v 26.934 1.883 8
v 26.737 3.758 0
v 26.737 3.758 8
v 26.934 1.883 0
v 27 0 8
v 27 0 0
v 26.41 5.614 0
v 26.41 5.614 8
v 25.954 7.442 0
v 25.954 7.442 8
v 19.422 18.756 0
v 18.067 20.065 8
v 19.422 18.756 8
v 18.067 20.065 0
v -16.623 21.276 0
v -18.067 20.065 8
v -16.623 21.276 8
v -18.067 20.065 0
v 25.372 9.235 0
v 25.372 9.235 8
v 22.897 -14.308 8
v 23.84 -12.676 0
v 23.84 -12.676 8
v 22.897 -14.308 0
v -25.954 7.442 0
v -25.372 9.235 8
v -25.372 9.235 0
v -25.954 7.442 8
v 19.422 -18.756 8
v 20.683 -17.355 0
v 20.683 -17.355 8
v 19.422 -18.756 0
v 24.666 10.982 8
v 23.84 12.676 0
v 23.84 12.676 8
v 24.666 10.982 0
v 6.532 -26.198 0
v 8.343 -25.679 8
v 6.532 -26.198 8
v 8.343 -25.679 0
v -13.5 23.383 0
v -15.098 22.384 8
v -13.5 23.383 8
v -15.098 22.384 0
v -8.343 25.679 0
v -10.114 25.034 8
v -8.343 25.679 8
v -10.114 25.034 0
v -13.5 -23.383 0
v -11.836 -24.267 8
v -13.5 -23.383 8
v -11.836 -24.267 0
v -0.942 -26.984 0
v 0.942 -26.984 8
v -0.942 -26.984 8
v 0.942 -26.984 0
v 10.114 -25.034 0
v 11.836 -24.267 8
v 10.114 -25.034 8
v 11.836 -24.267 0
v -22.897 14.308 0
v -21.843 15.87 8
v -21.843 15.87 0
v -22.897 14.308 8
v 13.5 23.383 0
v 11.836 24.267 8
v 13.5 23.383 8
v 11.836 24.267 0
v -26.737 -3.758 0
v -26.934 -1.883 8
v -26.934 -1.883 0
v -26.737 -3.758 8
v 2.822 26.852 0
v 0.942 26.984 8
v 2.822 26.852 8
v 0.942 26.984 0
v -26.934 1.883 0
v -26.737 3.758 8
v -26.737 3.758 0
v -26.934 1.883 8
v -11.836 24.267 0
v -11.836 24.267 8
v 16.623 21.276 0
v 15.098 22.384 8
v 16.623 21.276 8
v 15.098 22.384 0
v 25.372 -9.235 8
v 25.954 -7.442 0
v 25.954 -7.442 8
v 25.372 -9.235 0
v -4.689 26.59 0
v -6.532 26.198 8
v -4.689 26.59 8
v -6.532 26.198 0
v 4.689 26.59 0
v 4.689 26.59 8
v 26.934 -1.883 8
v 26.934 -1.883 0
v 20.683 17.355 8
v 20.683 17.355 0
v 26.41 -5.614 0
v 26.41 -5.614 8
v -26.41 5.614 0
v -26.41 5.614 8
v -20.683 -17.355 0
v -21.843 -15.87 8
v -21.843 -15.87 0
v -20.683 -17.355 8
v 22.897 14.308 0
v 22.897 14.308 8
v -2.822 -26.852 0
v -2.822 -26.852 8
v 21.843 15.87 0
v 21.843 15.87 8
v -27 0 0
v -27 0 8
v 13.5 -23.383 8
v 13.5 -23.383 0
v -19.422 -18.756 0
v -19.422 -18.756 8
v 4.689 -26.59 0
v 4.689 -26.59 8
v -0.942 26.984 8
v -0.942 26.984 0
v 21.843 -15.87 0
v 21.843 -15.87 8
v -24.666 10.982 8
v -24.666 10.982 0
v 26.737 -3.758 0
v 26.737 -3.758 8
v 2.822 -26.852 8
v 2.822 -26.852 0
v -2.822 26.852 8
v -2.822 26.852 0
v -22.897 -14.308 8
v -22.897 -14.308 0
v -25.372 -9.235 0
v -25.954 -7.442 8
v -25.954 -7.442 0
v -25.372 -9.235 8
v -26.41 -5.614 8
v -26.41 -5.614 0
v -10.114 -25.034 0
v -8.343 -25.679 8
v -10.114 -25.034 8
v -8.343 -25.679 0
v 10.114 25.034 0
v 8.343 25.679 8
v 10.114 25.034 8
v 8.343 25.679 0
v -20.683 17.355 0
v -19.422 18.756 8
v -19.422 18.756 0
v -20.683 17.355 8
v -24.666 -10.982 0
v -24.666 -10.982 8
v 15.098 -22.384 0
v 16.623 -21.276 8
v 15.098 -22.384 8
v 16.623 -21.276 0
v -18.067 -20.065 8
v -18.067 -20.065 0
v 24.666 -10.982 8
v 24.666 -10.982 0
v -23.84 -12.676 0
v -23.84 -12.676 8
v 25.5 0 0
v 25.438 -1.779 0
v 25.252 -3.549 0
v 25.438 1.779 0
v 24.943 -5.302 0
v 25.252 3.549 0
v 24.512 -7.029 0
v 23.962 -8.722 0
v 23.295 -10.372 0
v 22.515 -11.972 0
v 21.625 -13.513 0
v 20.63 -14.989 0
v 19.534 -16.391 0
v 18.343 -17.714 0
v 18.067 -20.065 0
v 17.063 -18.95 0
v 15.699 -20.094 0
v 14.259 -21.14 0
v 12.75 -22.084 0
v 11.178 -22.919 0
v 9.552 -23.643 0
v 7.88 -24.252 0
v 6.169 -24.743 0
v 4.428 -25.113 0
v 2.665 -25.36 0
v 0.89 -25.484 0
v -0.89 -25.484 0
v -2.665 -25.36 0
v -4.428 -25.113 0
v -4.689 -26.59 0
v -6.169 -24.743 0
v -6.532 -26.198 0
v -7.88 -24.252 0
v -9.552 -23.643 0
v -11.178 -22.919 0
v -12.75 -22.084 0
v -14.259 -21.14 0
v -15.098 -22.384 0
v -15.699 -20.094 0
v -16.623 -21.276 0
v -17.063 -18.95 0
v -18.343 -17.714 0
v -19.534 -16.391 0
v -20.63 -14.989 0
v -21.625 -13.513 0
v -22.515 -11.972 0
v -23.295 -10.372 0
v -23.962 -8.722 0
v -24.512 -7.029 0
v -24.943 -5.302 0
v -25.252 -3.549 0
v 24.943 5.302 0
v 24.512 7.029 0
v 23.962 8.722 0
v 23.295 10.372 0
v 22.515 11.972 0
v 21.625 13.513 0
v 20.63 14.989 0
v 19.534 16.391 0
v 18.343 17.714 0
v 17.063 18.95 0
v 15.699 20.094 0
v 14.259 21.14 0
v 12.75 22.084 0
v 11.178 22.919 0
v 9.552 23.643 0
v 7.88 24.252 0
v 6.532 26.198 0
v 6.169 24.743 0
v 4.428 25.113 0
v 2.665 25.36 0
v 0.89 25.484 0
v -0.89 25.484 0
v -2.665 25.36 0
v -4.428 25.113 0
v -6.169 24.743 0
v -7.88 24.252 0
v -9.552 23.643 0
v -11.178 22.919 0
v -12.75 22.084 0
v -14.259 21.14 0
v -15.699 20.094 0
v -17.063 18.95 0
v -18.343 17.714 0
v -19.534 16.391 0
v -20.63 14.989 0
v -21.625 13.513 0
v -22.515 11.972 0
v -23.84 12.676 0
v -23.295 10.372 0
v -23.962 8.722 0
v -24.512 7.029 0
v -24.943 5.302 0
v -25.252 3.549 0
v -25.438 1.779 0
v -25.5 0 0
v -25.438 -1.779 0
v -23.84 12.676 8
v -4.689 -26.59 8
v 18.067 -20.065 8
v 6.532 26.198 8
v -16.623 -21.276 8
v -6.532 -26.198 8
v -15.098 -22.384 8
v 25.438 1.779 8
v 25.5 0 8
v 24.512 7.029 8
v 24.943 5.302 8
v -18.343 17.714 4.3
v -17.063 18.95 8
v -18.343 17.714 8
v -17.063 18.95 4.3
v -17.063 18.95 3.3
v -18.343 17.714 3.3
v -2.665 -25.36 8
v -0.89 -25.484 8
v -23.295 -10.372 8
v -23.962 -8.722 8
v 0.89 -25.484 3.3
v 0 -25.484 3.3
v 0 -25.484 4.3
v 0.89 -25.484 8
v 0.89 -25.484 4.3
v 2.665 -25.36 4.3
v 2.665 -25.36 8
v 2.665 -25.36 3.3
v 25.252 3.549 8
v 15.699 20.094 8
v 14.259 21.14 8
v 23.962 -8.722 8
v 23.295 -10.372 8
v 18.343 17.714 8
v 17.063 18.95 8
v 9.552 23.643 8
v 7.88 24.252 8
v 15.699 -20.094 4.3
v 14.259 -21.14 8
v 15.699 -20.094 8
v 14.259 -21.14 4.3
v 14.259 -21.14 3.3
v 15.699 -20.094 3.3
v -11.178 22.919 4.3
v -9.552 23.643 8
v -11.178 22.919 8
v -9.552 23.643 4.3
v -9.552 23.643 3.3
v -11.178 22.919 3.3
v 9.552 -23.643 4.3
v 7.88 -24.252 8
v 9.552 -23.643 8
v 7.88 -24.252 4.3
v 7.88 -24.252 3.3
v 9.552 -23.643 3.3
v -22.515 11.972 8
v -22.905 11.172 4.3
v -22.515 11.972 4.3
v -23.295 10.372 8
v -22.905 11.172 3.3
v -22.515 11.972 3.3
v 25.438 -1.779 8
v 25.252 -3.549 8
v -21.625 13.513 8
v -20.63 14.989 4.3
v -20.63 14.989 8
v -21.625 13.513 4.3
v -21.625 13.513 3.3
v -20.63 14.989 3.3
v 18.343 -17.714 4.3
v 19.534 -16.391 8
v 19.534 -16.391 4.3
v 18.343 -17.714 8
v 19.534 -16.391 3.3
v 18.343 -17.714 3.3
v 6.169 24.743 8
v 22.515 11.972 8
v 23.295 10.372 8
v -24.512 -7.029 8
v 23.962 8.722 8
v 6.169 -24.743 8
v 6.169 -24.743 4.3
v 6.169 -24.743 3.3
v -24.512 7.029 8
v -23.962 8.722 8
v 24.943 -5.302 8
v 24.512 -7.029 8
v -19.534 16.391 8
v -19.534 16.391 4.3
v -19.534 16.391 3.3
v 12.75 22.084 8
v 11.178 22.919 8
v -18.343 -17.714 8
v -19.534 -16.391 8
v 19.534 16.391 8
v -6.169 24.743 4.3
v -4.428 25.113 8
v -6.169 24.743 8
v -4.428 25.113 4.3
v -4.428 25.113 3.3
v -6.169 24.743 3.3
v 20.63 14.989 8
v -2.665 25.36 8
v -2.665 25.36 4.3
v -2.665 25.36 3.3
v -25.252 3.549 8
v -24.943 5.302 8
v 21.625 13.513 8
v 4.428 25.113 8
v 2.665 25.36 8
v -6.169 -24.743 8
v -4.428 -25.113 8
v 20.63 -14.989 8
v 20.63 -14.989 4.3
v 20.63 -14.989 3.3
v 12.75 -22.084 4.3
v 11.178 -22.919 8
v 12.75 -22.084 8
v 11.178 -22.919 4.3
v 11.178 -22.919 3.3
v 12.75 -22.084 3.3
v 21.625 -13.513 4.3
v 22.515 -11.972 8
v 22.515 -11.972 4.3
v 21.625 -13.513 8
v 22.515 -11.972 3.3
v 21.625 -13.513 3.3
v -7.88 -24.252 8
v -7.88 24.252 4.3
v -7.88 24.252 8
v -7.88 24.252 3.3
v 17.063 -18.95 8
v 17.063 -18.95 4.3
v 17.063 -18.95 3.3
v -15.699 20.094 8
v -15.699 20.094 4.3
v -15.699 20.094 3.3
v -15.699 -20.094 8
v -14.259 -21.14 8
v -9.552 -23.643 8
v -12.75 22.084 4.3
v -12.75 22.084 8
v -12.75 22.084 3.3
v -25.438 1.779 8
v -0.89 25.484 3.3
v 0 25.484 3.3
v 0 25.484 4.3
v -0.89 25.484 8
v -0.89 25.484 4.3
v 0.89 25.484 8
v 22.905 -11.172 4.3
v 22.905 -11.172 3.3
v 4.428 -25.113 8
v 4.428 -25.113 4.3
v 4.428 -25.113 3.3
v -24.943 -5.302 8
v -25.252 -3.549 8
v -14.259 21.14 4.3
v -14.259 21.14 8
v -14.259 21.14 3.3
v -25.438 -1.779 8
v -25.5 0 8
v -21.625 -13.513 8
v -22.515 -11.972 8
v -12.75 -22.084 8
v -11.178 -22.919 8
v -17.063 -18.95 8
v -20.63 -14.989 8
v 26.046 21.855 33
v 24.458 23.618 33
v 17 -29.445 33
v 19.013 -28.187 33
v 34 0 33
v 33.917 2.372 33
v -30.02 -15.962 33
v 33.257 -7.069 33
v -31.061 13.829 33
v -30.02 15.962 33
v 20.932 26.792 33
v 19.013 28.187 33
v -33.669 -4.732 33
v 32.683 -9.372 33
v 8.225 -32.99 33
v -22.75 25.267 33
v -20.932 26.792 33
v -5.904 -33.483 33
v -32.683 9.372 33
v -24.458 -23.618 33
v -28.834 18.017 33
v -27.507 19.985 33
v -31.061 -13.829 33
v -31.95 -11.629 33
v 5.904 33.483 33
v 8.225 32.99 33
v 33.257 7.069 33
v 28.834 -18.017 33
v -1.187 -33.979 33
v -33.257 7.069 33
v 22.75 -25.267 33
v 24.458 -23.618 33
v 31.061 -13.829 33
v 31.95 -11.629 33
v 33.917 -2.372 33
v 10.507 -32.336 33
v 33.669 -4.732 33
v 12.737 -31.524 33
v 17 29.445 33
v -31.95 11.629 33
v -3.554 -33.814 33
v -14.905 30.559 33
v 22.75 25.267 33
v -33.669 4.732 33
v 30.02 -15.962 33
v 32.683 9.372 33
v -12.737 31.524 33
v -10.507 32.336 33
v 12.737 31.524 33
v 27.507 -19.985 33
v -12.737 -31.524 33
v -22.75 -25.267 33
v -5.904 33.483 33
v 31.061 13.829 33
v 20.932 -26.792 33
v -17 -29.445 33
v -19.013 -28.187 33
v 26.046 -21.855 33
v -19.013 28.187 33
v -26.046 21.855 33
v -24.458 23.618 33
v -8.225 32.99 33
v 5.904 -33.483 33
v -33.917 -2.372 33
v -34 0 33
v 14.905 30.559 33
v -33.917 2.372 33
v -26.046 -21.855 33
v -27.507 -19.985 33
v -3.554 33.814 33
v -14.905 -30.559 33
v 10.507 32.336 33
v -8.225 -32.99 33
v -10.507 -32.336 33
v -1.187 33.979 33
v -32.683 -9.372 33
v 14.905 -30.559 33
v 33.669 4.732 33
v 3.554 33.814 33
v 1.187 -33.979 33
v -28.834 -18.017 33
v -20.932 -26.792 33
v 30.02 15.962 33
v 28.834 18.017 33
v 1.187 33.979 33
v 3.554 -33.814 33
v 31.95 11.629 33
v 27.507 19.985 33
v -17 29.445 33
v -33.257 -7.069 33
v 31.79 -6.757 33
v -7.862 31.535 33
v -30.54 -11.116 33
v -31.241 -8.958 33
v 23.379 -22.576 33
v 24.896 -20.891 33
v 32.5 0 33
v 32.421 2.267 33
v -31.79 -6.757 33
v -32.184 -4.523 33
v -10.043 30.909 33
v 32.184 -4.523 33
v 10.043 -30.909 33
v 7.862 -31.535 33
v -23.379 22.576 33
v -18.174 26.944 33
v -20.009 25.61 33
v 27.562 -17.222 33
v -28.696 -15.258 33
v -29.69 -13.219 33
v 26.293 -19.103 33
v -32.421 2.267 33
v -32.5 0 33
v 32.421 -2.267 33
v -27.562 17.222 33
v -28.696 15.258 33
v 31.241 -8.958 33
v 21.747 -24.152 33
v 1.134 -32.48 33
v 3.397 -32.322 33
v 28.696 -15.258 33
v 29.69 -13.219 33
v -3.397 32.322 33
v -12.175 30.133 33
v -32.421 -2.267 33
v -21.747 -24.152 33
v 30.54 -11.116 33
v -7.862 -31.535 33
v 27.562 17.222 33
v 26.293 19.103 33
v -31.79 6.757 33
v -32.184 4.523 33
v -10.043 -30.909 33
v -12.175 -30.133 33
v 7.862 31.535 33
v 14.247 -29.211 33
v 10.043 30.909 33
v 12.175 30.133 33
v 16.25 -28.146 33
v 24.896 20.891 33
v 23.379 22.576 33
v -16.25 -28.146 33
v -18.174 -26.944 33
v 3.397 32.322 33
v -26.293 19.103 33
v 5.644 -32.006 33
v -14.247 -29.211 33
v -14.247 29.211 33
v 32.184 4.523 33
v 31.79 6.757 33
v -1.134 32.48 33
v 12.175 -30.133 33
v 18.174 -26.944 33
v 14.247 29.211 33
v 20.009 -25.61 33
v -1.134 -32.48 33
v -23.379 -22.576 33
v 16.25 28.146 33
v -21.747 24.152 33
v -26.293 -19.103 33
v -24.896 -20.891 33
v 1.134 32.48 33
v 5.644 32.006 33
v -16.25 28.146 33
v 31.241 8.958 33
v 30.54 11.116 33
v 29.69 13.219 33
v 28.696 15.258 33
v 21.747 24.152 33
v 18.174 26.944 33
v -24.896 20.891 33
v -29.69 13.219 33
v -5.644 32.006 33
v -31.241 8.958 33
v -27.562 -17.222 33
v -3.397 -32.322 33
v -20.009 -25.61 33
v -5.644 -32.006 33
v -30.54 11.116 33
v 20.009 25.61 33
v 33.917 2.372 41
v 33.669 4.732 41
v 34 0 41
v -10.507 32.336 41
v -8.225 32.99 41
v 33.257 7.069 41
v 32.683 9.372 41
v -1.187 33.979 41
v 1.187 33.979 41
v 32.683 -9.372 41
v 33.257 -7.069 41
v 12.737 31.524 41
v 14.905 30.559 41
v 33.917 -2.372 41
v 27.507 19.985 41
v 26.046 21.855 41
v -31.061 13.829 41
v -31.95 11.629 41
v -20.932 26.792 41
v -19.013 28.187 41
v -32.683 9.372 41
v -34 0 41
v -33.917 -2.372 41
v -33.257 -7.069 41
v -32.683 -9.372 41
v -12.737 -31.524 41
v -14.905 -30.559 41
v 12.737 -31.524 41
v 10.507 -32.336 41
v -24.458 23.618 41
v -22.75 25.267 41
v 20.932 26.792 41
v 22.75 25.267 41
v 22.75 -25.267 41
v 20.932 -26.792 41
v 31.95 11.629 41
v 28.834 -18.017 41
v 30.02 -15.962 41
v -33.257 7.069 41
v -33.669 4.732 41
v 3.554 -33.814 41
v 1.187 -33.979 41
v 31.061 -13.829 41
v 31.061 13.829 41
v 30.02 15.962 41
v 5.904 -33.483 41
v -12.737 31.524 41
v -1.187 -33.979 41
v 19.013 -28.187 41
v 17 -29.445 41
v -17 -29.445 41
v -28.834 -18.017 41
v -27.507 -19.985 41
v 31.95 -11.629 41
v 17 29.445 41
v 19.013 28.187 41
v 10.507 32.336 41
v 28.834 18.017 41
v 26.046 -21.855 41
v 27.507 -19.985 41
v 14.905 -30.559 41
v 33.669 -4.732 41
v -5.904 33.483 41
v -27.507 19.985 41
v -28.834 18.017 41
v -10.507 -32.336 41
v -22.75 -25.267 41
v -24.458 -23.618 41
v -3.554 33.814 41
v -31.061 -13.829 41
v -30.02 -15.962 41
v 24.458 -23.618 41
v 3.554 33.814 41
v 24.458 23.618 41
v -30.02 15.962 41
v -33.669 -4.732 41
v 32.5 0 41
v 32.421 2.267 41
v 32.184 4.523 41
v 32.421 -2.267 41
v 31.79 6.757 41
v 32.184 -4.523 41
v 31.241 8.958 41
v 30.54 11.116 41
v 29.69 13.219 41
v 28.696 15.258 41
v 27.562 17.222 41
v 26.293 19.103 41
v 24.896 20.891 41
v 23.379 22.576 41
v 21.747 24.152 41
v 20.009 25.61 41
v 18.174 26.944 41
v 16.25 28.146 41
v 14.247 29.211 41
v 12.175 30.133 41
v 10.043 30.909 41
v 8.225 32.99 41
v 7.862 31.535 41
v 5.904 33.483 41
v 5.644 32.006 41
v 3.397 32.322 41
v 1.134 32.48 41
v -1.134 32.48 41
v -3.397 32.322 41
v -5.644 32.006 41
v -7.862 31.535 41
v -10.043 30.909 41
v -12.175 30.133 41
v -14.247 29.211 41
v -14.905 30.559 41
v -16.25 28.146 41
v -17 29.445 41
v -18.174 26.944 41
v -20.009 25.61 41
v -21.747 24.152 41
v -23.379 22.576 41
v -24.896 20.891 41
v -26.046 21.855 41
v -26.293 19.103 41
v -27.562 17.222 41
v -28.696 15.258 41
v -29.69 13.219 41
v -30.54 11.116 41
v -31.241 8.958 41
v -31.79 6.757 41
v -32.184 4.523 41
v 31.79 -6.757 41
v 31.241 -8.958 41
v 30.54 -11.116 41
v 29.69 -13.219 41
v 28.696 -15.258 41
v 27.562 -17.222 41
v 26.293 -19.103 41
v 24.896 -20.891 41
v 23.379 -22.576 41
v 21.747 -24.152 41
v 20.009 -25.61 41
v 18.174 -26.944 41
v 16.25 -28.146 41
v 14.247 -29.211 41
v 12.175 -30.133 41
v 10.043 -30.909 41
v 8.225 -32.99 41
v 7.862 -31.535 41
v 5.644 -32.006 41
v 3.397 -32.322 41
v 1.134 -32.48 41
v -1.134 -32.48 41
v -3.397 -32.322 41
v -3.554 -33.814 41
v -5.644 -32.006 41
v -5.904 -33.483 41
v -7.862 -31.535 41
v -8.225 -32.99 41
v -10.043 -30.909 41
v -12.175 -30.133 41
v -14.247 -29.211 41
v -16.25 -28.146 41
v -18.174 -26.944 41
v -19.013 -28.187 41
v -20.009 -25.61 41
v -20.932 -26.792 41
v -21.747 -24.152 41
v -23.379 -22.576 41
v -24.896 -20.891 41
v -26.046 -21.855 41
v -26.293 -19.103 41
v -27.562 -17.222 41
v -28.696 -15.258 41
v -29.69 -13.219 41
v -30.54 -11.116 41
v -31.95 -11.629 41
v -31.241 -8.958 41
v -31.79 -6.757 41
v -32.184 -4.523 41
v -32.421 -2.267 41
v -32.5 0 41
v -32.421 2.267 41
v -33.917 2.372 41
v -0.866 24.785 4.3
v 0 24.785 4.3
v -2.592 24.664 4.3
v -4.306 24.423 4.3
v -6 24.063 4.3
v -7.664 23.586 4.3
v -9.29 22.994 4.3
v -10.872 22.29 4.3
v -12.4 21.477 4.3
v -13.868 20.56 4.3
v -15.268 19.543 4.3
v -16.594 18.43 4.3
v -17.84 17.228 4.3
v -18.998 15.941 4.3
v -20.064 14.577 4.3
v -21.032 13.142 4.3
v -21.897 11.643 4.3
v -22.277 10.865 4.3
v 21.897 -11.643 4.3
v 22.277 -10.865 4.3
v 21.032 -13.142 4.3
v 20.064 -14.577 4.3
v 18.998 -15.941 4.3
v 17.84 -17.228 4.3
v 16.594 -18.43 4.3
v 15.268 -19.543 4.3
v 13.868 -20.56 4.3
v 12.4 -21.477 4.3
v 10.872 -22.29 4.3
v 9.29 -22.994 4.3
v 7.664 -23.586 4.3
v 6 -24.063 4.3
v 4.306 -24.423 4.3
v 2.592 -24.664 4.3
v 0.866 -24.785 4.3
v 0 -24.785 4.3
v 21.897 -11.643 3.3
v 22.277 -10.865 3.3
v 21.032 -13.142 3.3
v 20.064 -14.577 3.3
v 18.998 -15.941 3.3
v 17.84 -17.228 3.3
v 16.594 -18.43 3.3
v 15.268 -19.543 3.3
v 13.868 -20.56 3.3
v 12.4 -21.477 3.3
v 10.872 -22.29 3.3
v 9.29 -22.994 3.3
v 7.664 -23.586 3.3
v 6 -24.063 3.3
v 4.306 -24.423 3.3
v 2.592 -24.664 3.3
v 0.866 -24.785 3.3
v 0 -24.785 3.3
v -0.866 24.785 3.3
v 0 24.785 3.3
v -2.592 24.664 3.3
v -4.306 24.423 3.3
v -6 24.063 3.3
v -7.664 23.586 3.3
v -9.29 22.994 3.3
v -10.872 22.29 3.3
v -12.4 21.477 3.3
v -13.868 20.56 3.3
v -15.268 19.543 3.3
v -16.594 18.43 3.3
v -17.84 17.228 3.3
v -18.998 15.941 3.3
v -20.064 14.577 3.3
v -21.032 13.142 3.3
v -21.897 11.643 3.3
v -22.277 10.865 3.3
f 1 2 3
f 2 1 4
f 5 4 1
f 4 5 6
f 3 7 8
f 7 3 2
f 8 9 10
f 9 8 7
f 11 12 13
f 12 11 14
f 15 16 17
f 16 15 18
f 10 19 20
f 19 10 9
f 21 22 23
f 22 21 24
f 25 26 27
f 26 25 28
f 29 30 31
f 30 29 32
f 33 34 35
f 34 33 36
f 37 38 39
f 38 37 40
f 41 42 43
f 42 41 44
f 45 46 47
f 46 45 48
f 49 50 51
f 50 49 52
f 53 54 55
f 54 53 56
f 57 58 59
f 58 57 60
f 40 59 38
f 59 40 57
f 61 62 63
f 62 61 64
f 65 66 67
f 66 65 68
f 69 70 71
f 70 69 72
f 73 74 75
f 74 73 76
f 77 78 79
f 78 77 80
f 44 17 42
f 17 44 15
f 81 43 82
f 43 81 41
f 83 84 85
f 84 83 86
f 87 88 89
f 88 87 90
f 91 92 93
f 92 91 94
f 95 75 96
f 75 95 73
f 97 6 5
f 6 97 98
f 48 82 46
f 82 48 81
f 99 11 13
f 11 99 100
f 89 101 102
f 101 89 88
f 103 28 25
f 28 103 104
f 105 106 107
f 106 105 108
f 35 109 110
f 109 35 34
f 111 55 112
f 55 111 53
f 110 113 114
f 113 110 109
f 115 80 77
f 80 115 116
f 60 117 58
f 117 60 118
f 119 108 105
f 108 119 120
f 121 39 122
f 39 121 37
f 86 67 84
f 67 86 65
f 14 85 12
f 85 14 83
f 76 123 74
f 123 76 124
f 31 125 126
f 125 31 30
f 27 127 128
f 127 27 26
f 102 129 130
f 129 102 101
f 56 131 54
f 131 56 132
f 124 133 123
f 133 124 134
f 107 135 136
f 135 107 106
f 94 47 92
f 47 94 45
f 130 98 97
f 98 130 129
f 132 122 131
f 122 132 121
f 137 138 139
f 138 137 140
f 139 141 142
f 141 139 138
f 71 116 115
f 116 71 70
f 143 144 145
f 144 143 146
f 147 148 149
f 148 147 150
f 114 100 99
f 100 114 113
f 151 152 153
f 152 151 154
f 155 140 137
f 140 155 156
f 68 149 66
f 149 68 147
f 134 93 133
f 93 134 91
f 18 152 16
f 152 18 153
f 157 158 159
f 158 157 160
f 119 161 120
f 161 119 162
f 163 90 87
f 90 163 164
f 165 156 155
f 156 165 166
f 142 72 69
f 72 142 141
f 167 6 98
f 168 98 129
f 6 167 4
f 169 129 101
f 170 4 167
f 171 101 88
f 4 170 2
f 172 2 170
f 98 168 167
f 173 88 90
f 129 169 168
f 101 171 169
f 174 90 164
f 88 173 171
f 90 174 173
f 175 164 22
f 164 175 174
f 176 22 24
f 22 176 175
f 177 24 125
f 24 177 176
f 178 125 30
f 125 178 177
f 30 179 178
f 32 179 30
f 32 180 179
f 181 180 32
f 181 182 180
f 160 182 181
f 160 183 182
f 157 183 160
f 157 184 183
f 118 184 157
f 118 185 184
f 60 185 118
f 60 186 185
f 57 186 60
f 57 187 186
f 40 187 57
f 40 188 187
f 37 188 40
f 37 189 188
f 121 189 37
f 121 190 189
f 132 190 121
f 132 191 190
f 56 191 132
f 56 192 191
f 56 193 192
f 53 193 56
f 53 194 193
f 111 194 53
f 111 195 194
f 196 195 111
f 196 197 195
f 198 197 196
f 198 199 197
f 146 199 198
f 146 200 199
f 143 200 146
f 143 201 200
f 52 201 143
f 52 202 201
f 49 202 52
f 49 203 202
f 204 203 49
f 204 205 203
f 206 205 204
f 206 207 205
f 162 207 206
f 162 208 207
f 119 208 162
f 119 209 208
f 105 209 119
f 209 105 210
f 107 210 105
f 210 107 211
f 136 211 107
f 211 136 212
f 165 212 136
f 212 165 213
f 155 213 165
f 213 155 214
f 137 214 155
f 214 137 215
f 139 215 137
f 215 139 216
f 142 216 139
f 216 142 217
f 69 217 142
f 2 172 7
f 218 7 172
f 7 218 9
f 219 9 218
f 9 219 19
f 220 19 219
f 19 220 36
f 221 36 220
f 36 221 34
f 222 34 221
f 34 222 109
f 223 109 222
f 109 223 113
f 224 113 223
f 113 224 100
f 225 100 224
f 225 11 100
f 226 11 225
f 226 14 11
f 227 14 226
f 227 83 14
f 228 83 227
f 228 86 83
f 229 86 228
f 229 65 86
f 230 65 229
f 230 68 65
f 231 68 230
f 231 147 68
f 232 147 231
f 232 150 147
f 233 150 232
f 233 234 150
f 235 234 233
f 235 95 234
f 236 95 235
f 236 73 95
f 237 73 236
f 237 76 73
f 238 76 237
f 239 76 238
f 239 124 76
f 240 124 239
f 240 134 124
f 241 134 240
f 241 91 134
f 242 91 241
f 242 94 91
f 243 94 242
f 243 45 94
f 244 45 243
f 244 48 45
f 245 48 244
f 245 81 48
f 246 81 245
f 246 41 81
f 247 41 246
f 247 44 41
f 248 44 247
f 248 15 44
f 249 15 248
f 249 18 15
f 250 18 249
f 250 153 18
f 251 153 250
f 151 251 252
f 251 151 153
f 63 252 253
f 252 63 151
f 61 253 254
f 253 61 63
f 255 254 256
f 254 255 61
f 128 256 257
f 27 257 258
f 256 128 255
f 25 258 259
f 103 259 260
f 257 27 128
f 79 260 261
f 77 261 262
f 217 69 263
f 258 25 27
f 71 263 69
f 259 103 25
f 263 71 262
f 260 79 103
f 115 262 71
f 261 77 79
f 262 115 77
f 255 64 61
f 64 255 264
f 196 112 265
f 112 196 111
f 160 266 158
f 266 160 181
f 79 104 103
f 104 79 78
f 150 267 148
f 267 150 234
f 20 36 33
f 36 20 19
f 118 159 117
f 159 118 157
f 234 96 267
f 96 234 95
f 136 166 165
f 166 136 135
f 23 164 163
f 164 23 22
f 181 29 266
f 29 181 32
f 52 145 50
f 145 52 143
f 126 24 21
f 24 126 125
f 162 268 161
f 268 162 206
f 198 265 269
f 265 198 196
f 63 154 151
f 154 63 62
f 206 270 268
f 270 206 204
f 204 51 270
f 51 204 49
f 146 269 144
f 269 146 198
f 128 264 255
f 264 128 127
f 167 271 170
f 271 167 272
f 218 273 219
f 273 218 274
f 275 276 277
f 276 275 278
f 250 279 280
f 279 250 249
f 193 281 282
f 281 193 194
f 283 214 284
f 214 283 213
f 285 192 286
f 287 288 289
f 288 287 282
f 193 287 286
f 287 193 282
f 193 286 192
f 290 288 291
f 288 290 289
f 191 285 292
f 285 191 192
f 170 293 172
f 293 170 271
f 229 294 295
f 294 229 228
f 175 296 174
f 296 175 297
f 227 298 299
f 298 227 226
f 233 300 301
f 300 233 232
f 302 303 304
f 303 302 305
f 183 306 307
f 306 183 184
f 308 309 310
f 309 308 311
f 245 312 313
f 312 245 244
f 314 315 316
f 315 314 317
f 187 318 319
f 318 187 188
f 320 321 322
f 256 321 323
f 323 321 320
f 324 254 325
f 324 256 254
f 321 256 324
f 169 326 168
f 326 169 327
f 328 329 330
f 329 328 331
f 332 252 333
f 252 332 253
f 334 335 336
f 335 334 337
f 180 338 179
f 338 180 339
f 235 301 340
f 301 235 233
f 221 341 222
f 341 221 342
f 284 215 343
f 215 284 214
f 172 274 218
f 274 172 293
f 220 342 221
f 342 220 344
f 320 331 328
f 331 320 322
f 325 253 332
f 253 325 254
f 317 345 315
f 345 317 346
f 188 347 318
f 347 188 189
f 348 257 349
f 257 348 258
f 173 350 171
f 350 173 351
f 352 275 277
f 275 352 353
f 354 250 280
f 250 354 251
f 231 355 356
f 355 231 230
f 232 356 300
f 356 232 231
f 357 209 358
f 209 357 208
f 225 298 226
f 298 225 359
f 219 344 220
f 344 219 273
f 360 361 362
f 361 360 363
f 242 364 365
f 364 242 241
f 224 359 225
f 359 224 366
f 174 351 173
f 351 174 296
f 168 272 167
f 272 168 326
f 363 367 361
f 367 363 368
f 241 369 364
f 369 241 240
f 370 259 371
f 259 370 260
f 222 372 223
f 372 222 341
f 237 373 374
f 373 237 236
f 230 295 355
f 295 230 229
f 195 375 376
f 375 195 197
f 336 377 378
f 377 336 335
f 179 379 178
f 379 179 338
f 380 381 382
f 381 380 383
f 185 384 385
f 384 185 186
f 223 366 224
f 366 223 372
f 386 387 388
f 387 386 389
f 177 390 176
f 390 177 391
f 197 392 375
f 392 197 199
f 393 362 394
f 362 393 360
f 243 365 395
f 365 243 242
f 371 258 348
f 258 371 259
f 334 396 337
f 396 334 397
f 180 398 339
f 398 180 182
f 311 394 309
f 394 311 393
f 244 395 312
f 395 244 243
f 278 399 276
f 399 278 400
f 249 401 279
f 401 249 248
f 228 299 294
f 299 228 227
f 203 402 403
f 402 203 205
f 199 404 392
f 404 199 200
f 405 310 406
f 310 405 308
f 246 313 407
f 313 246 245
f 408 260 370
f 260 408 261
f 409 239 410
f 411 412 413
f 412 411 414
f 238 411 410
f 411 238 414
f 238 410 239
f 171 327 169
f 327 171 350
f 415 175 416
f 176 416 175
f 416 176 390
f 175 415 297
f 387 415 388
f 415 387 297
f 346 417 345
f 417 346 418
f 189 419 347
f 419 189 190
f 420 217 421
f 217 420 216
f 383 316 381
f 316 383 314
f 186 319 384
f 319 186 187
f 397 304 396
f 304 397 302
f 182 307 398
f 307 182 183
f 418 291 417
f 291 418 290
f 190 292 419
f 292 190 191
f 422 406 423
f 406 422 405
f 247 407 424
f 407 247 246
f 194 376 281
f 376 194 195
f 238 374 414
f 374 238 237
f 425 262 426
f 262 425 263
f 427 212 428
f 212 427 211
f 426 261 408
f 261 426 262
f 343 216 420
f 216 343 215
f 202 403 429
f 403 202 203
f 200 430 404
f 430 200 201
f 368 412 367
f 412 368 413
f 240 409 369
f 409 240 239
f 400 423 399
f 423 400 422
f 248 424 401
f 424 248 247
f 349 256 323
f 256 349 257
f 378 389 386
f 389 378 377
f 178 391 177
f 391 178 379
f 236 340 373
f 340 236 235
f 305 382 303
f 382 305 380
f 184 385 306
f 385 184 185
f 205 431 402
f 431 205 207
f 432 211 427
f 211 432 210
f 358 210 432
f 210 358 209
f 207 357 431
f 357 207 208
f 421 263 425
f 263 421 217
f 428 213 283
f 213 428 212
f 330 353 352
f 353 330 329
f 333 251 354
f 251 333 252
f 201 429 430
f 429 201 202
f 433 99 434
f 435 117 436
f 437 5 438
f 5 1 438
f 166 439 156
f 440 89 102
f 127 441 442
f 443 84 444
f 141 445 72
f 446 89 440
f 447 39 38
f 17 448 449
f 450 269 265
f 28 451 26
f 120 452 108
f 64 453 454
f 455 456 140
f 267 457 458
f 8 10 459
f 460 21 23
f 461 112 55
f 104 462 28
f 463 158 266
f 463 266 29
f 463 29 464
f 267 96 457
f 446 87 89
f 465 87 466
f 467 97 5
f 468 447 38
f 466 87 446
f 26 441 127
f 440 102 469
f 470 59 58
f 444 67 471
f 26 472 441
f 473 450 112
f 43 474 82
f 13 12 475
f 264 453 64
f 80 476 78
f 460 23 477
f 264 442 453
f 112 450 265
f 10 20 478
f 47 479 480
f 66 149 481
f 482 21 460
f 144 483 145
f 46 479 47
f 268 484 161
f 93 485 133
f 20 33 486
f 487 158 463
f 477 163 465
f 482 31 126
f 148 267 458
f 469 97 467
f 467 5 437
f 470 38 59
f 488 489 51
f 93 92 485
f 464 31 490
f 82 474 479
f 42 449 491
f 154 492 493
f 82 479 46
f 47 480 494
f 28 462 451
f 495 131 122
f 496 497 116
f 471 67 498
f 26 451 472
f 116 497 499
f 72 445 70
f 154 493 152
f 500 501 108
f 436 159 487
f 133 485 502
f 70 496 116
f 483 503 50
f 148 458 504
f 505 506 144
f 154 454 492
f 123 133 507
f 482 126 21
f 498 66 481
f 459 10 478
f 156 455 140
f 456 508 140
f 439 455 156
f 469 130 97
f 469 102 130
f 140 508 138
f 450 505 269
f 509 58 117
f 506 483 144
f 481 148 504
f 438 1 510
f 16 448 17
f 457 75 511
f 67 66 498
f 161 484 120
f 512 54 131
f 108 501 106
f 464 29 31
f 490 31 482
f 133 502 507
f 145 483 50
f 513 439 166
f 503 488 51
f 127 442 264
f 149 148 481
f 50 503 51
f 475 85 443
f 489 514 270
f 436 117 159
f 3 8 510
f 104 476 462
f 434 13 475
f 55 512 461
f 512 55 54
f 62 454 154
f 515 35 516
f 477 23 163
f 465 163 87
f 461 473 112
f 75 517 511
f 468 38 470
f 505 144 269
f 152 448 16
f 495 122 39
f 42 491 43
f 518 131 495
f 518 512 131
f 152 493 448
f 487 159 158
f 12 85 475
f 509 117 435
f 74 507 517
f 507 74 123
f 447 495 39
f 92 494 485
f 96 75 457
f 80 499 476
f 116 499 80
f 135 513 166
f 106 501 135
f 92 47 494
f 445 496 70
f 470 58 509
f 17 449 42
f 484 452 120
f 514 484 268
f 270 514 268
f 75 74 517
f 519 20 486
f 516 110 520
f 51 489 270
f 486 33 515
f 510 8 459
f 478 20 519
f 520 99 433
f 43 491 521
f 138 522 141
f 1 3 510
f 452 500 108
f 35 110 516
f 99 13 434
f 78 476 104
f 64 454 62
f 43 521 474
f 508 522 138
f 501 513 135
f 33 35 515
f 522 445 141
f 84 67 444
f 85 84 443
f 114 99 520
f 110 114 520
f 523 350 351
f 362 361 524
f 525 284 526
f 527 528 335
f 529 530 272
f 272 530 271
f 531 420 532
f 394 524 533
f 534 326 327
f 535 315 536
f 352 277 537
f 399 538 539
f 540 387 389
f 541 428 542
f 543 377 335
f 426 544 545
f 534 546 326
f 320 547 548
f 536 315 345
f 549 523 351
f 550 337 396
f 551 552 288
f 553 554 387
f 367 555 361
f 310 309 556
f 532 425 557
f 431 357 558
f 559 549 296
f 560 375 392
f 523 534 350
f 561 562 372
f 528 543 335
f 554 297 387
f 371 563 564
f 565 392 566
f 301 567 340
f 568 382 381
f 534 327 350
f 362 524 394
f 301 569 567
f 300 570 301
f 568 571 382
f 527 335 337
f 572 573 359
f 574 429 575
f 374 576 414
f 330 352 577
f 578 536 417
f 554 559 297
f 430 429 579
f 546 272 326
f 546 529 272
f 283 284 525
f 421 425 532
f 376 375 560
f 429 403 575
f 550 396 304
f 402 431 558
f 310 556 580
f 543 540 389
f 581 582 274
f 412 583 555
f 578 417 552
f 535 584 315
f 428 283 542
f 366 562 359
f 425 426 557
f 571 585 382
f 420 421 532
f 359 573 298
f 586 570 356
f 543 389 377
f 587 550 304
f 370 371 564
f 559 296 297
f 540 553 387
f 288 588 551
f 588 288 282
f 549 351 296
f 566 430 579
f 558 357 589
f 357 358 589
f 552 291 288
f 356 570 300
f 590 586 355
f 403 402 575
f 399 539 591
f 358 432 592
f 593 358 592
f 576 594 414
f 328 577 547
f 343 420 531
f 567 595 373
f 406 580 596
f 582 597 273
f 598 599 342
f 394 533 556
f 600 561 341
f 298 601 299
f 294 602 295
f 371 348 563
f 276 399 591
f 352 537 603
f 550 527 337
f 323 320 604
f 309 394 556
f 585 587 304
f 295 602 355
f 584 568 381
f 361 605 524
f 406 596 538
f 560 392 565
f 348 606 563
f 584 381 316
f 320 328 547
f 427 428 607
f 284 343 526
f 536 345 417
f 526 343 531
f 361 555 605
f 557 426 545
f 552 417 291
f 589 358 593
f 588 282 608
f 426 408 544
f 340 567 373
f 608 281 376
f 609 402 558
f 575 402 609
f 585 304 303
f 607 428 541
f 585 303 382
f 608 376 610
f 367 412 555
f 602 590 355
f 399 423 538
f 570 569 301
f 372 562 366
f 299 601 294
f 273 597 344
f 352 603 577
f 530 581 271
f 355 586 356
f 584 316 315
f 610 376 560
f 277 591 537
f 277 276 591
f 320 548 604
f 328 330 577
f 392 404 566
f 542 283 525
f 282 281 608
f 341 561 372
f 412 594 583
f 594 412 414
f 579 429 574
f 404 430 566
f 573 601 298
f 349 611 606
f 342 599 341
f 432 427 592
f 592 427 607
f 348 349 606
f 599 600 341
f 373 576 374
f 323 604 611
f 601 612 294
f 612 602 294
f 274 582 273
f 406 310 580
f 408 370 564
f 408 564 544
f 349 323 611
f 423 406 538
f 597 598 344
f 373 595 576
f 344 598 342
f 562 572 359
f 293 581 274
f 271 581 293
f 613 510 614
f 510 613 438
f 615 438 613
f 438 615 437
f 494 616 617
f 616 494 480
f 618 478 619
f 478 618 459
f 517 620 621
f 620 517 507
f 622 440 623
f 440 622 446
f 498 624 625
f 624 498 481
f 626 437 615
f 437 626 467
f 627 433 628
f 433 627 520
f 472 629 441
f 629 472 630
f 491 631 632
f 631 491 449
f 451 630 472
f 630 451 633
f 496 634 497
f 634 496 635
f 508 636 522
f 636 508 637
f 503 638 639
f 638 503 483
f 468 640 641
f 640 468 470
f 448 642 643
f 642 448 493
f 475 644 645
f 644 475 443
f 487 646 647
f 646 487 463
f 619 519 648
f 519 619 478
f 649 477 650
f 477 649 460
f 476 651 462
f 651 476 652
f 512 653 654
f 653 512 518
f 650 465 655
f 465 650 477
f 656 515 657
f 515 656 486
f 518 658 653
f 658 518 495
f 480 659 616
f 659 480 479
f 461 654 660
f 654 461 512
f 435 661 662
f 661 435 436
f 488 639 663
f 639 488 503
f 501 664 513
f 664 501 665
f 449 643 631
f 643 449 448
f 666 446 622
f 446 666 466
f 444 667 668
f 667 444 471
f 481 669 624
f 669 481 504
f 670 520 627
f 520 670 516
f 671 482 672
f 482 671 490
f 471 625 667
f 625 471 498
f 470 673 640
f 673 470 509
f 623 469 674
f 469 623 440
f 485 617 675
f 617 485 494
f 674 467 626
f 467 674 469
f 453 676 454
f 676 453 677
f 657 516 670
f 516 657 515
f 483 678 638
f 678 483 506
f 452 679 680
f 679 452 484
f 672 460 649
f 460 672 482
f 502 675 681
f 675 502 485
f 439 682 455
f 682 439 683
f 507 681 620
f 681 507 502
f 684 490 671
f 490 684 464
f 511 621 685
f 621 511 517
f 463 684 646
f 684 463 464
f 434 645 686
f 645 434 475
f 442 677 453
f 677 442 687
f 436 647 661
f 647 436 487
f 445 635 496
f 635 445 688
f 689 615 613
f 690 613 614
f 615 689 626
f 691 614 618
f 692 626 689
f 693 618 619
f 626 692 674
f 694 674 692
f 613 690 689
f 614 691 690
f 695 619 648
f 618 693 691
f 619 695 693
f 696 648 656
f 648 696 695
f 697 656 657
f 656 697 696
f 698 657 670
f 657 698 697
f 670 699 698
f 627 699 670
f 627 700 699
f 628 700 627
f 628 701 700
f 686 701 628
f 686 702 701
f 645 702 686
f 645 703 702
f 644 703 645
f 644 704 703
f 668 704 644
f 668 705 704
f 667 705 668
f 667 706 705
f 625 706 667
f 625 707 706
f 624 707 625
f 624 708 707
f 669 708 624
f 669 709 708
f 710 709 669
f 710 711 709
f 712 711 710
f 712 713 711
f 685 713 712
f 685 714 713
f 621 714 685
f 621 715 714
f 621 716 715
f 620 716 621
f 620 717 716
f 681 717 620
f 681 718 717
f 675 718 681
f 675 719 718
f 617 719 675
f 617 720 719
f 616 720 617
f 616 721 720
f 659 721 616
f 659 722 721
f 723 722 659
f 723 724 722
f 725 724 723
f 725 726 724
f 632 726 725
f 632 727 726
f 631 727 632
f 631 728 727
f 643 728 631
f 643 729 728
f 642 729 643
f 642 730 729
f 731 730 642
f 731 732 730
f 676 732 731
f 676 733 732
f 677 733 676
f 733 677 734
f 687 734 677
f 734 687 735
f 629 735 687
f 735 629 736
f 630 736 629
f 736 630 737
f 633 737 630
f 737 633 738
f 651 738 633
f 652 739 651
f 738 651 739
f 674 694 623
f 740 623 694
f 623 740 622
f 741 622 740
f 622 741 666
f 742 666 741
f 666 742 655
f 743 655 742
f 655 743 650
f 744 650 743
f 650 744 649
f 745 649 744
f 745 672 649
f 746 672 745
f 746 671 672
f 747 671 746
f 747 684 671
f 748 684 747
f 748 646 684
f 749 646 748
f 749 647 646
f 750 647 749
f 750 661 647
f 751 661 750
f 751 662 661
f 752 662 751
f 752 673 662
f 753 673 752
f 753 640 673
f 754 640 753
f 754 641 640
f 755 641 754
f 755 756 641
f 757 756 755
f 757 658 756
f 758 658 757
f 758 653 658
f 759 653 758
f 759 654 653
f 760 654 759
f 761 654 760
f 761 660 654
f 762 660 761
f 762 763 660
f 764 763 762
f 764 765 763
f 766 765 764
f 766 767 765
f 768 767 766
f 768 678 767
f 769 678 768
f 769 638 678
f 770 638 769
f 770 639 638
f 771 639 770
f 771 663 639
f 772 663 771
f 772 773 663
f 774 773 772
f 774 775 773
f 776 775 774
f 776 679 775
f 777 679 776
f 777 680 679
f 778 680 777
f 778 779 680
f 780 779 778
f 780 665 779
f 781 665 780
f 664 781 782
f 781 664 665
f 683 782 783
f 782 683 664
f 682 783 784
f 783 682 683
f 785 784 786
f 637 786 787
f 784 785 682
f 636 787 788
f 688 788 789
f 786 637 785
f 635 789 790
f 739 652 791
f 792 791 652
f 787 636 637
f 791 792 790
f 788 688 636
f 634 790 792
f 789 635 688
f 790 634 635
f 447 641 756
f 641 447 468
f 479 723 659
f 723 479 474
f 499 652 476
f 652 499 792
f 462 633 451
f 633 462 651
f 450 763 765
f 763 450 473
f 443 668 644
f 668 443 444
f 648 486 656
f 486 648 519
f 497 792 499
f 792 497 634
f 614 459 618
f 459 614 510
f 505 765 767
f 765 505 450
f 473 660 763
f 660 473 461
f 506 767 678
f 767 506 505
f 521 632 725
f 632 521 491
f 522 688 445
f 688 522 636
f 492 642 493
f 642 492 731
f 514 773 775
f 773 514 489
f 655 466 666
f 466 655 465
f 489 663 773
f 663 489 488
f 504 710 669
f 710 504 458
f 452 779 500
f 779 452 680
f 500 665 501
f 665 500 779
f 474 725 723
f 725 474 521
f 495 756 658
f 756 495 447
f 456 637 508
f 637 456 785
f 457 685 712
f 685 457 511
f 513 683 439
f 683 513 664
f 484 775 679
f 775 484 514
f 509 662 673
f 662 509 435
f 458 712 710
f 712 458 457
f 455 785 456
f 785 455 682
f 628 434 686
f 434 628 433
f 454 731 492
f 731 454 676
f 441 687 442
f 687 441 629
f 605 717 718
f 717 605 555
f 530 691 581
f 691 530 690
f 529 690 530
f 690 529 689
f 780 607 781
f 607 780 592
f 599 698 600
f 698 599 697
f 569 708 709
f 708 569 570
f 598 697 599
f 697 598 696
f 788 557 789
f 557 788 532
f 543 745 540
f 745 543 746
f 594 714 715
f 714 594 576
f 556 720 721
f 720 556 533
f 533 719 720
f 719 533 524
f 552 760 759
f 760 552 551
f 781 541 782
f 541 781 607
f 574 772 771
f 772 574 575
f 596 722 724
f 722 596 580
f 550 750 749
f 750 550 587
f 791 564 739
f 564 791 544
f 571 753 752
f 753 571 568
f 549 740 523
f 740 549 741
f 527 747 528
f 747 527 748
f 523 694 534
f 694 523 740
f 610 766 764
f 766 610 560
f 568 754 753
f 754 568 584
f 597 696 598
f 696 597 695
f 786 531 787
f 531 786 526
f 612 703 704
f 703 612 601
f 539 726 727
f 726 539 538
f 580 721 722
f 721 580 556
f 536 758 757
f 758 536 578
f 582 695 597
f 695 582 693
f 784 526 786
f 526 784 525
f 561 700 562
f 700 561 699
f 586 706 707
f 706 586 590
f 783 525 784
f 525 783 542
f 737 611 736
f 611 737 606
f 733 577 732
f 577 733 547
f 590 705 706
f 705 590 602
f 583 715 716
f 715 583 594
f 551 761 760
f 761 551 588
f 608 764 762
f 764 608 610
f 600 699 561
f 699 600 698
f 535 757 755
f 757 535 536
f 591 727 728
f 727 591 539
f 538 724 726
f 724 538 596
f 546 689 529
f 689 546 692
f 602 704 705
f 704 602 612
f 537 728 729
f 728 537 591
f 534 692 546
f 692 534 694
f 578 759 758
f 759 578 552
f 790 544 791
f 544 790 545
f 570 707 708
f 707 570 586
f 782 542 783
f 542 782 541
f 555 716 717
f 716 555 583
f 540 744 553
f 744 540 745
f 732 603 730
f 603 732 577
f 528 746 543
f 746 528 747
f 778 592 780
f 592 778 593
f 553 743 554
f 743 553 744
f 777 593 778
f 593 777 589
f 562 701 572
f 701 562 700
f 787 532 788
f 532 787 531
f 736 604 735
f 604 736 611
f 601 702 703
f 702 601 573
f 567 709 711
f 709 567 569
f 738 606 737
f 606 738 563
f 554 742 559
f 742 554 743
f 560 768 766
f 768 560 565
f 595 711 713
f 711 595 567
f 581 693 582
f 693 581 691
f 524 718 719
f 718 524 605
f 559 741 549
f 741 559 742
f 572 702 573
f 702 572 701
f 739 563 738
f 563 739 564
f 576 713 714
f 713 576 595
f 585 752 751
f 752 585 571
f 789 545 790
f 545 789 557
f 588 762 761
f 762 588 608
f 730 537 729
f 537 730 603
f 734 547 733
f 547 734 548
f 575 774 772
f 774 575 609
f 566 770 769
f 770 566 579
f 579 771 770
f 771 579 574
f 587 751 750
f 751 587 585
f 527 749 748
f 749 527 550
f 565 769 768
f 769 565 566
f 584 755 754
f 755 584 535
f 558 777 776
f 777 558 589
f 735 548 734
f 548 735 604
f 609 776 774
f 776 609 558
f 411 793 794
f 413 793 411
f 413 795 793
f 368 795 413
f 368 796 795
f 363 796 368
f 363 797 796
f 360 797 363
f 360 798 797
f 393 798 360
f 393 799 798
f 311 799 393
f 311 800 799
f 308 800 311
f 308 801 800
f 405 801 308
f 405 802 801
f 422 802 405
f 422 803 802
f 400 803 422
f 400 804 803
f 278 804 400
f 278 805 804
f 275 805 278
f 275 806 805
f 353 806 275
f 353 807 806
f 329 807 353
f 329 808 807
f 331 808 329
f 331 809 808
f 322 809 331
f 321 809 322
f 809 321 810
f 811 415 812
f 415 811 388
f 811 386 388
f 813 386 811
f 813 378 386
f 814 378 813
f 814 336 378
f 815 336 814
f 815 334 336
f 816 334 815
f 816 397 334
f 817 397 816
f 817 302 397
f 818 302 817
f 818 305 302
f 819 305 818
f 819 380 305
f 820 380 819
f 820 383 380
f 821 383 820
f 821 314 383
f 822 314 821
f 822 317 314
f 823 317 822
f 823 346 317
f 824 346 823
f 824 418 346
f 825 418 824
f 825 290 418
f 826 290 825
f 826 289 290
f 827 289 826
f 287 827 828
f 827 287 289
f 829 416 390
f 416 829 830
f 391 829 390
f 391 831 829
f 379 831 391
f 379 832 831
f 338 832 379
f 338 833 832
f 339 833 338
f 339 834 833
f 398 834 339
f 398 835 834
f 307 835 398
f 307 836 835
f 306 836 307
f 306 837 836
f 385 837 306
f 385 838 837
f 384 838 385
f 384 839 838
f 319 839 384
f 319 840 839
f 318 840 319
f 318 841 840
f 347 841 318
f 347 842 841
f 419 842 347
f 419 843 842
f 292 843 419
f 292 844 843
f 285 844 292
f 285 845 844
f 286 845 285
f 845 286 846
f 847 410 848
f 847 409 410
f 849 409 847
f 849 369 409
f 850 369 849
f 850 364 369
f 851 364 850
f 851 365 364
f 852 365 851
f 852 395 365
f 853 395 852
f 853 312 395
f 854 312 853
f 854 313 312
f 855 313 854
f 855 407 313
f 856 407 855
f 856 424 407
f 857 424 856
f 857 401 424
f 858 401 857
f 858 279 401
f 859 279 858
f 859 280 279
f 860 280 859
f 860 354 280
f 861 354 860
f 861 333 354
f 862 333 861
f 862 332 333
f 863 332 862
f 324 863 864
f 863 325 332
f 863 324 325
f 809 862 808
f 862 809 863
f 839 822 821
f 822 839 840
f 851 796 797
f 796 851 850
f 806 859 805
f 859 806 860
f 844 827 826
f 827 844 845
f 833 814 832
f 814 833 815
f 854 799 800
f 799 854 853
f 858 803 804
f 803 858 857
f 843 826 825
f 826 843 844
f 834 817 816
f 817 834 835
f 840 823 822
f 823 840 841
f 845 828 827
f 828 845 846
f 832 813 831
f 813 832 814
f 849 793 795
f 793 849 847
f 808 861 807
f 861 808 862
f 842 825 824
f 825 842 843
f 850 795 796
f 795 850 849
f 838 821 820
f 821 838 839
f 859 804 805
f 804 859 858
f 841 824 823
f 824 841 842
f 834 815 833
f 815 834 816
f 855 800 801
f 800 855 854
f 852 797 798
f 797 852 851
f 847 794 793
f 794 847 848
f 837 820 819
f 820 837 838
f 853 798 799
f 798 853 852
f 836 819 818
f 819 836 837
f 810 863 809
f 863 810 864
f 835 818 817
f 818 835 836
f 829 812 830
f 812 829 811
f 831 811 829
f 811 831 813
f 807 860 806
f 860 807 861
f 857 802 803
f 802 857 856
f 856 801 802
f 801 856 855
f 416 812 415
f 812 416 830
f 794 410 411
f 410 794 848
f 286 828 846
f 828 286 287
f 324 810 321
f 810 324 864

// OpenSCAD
//Thickness of tube walls
thickness=1.5;
//Inside diameter of bottom tube
d1_inside=51;   
//Height of bottom tube
h1=8;   
//Inside diameter of top tube
d2_inside=65;   
//Height of top tube
h2=8;   
//Height of connector section
c_ht=25;
// Percentage of circumference for one flange
f_pcent=18;
// Flange thickness
f_th=.7;
//Flange height
f_ht=1;
// Resolution
$fn=90;

d1=d1_inside+2*thickness;
d2=d2_inside+2*thickness;
mask_degree=ceil(180-(f_pcent/100*360)); // this is the angle of the pie_slice mask HSL change 120 to 180
assemble();
//-----------------------------------------------------------------------
module tube(d,h,t) { // diameter height thickness
rad=d/2;
difference() {
cylinder(h=h,r=rad);
cylinder(h=h,r=rad-t);
}
}
//-----------------------------------------------------------------------

module connector(){
difference() {
cylinder (h=c_ht,r1=d1/2,r2=d2/2);
cylinder (h=c_ht,r1=d1/2-thickness,r2=d2/2-thickness);
}
}
//-----------------------------------------------------------------------

module flange() { // the TWO connecting lugs at the base HSL
  difference() {
  tube(d1-thickness*2,f_ht,f_th);
  union () {     
          pie_slice(0,mask_degree,d1,f_ht)  ; //65 deg is the amount to remove
          pie_slice(180,mask_degree,d1,f_ht)  ;
          //pie_slice(240,mask_degree,d1,f_ht)  ;
    }
  }
}
//-----------------------------------------------------------------------

module pie_slice(a,b,rad,h) { // make a pie slice starting at angle a continuing for angle b with radius of rad and height of h
    x1=sin(a)*rad;
    y1=cos(a)*rad;
    x2=sin(a+b)*rad;
    y2=cos(a+b)*rad;
    linear_extrude(height=h)
    polygon(
        points=[ [0,0],[x1,y1],[x2,y2]]
    );
}
//-----------------------------------------------------------------------

module assemble() {
union() {
    tube(d1,h1,thickness); //bottom tube
    translate([0,0,h1]) connector();  // connector
    translate([0,0,h1+c_ht])  tube(d2,h2,thickness); // top tube
    translate([0,0,h1/2-f_th]) flange(); //connecting lugs
    }
};
